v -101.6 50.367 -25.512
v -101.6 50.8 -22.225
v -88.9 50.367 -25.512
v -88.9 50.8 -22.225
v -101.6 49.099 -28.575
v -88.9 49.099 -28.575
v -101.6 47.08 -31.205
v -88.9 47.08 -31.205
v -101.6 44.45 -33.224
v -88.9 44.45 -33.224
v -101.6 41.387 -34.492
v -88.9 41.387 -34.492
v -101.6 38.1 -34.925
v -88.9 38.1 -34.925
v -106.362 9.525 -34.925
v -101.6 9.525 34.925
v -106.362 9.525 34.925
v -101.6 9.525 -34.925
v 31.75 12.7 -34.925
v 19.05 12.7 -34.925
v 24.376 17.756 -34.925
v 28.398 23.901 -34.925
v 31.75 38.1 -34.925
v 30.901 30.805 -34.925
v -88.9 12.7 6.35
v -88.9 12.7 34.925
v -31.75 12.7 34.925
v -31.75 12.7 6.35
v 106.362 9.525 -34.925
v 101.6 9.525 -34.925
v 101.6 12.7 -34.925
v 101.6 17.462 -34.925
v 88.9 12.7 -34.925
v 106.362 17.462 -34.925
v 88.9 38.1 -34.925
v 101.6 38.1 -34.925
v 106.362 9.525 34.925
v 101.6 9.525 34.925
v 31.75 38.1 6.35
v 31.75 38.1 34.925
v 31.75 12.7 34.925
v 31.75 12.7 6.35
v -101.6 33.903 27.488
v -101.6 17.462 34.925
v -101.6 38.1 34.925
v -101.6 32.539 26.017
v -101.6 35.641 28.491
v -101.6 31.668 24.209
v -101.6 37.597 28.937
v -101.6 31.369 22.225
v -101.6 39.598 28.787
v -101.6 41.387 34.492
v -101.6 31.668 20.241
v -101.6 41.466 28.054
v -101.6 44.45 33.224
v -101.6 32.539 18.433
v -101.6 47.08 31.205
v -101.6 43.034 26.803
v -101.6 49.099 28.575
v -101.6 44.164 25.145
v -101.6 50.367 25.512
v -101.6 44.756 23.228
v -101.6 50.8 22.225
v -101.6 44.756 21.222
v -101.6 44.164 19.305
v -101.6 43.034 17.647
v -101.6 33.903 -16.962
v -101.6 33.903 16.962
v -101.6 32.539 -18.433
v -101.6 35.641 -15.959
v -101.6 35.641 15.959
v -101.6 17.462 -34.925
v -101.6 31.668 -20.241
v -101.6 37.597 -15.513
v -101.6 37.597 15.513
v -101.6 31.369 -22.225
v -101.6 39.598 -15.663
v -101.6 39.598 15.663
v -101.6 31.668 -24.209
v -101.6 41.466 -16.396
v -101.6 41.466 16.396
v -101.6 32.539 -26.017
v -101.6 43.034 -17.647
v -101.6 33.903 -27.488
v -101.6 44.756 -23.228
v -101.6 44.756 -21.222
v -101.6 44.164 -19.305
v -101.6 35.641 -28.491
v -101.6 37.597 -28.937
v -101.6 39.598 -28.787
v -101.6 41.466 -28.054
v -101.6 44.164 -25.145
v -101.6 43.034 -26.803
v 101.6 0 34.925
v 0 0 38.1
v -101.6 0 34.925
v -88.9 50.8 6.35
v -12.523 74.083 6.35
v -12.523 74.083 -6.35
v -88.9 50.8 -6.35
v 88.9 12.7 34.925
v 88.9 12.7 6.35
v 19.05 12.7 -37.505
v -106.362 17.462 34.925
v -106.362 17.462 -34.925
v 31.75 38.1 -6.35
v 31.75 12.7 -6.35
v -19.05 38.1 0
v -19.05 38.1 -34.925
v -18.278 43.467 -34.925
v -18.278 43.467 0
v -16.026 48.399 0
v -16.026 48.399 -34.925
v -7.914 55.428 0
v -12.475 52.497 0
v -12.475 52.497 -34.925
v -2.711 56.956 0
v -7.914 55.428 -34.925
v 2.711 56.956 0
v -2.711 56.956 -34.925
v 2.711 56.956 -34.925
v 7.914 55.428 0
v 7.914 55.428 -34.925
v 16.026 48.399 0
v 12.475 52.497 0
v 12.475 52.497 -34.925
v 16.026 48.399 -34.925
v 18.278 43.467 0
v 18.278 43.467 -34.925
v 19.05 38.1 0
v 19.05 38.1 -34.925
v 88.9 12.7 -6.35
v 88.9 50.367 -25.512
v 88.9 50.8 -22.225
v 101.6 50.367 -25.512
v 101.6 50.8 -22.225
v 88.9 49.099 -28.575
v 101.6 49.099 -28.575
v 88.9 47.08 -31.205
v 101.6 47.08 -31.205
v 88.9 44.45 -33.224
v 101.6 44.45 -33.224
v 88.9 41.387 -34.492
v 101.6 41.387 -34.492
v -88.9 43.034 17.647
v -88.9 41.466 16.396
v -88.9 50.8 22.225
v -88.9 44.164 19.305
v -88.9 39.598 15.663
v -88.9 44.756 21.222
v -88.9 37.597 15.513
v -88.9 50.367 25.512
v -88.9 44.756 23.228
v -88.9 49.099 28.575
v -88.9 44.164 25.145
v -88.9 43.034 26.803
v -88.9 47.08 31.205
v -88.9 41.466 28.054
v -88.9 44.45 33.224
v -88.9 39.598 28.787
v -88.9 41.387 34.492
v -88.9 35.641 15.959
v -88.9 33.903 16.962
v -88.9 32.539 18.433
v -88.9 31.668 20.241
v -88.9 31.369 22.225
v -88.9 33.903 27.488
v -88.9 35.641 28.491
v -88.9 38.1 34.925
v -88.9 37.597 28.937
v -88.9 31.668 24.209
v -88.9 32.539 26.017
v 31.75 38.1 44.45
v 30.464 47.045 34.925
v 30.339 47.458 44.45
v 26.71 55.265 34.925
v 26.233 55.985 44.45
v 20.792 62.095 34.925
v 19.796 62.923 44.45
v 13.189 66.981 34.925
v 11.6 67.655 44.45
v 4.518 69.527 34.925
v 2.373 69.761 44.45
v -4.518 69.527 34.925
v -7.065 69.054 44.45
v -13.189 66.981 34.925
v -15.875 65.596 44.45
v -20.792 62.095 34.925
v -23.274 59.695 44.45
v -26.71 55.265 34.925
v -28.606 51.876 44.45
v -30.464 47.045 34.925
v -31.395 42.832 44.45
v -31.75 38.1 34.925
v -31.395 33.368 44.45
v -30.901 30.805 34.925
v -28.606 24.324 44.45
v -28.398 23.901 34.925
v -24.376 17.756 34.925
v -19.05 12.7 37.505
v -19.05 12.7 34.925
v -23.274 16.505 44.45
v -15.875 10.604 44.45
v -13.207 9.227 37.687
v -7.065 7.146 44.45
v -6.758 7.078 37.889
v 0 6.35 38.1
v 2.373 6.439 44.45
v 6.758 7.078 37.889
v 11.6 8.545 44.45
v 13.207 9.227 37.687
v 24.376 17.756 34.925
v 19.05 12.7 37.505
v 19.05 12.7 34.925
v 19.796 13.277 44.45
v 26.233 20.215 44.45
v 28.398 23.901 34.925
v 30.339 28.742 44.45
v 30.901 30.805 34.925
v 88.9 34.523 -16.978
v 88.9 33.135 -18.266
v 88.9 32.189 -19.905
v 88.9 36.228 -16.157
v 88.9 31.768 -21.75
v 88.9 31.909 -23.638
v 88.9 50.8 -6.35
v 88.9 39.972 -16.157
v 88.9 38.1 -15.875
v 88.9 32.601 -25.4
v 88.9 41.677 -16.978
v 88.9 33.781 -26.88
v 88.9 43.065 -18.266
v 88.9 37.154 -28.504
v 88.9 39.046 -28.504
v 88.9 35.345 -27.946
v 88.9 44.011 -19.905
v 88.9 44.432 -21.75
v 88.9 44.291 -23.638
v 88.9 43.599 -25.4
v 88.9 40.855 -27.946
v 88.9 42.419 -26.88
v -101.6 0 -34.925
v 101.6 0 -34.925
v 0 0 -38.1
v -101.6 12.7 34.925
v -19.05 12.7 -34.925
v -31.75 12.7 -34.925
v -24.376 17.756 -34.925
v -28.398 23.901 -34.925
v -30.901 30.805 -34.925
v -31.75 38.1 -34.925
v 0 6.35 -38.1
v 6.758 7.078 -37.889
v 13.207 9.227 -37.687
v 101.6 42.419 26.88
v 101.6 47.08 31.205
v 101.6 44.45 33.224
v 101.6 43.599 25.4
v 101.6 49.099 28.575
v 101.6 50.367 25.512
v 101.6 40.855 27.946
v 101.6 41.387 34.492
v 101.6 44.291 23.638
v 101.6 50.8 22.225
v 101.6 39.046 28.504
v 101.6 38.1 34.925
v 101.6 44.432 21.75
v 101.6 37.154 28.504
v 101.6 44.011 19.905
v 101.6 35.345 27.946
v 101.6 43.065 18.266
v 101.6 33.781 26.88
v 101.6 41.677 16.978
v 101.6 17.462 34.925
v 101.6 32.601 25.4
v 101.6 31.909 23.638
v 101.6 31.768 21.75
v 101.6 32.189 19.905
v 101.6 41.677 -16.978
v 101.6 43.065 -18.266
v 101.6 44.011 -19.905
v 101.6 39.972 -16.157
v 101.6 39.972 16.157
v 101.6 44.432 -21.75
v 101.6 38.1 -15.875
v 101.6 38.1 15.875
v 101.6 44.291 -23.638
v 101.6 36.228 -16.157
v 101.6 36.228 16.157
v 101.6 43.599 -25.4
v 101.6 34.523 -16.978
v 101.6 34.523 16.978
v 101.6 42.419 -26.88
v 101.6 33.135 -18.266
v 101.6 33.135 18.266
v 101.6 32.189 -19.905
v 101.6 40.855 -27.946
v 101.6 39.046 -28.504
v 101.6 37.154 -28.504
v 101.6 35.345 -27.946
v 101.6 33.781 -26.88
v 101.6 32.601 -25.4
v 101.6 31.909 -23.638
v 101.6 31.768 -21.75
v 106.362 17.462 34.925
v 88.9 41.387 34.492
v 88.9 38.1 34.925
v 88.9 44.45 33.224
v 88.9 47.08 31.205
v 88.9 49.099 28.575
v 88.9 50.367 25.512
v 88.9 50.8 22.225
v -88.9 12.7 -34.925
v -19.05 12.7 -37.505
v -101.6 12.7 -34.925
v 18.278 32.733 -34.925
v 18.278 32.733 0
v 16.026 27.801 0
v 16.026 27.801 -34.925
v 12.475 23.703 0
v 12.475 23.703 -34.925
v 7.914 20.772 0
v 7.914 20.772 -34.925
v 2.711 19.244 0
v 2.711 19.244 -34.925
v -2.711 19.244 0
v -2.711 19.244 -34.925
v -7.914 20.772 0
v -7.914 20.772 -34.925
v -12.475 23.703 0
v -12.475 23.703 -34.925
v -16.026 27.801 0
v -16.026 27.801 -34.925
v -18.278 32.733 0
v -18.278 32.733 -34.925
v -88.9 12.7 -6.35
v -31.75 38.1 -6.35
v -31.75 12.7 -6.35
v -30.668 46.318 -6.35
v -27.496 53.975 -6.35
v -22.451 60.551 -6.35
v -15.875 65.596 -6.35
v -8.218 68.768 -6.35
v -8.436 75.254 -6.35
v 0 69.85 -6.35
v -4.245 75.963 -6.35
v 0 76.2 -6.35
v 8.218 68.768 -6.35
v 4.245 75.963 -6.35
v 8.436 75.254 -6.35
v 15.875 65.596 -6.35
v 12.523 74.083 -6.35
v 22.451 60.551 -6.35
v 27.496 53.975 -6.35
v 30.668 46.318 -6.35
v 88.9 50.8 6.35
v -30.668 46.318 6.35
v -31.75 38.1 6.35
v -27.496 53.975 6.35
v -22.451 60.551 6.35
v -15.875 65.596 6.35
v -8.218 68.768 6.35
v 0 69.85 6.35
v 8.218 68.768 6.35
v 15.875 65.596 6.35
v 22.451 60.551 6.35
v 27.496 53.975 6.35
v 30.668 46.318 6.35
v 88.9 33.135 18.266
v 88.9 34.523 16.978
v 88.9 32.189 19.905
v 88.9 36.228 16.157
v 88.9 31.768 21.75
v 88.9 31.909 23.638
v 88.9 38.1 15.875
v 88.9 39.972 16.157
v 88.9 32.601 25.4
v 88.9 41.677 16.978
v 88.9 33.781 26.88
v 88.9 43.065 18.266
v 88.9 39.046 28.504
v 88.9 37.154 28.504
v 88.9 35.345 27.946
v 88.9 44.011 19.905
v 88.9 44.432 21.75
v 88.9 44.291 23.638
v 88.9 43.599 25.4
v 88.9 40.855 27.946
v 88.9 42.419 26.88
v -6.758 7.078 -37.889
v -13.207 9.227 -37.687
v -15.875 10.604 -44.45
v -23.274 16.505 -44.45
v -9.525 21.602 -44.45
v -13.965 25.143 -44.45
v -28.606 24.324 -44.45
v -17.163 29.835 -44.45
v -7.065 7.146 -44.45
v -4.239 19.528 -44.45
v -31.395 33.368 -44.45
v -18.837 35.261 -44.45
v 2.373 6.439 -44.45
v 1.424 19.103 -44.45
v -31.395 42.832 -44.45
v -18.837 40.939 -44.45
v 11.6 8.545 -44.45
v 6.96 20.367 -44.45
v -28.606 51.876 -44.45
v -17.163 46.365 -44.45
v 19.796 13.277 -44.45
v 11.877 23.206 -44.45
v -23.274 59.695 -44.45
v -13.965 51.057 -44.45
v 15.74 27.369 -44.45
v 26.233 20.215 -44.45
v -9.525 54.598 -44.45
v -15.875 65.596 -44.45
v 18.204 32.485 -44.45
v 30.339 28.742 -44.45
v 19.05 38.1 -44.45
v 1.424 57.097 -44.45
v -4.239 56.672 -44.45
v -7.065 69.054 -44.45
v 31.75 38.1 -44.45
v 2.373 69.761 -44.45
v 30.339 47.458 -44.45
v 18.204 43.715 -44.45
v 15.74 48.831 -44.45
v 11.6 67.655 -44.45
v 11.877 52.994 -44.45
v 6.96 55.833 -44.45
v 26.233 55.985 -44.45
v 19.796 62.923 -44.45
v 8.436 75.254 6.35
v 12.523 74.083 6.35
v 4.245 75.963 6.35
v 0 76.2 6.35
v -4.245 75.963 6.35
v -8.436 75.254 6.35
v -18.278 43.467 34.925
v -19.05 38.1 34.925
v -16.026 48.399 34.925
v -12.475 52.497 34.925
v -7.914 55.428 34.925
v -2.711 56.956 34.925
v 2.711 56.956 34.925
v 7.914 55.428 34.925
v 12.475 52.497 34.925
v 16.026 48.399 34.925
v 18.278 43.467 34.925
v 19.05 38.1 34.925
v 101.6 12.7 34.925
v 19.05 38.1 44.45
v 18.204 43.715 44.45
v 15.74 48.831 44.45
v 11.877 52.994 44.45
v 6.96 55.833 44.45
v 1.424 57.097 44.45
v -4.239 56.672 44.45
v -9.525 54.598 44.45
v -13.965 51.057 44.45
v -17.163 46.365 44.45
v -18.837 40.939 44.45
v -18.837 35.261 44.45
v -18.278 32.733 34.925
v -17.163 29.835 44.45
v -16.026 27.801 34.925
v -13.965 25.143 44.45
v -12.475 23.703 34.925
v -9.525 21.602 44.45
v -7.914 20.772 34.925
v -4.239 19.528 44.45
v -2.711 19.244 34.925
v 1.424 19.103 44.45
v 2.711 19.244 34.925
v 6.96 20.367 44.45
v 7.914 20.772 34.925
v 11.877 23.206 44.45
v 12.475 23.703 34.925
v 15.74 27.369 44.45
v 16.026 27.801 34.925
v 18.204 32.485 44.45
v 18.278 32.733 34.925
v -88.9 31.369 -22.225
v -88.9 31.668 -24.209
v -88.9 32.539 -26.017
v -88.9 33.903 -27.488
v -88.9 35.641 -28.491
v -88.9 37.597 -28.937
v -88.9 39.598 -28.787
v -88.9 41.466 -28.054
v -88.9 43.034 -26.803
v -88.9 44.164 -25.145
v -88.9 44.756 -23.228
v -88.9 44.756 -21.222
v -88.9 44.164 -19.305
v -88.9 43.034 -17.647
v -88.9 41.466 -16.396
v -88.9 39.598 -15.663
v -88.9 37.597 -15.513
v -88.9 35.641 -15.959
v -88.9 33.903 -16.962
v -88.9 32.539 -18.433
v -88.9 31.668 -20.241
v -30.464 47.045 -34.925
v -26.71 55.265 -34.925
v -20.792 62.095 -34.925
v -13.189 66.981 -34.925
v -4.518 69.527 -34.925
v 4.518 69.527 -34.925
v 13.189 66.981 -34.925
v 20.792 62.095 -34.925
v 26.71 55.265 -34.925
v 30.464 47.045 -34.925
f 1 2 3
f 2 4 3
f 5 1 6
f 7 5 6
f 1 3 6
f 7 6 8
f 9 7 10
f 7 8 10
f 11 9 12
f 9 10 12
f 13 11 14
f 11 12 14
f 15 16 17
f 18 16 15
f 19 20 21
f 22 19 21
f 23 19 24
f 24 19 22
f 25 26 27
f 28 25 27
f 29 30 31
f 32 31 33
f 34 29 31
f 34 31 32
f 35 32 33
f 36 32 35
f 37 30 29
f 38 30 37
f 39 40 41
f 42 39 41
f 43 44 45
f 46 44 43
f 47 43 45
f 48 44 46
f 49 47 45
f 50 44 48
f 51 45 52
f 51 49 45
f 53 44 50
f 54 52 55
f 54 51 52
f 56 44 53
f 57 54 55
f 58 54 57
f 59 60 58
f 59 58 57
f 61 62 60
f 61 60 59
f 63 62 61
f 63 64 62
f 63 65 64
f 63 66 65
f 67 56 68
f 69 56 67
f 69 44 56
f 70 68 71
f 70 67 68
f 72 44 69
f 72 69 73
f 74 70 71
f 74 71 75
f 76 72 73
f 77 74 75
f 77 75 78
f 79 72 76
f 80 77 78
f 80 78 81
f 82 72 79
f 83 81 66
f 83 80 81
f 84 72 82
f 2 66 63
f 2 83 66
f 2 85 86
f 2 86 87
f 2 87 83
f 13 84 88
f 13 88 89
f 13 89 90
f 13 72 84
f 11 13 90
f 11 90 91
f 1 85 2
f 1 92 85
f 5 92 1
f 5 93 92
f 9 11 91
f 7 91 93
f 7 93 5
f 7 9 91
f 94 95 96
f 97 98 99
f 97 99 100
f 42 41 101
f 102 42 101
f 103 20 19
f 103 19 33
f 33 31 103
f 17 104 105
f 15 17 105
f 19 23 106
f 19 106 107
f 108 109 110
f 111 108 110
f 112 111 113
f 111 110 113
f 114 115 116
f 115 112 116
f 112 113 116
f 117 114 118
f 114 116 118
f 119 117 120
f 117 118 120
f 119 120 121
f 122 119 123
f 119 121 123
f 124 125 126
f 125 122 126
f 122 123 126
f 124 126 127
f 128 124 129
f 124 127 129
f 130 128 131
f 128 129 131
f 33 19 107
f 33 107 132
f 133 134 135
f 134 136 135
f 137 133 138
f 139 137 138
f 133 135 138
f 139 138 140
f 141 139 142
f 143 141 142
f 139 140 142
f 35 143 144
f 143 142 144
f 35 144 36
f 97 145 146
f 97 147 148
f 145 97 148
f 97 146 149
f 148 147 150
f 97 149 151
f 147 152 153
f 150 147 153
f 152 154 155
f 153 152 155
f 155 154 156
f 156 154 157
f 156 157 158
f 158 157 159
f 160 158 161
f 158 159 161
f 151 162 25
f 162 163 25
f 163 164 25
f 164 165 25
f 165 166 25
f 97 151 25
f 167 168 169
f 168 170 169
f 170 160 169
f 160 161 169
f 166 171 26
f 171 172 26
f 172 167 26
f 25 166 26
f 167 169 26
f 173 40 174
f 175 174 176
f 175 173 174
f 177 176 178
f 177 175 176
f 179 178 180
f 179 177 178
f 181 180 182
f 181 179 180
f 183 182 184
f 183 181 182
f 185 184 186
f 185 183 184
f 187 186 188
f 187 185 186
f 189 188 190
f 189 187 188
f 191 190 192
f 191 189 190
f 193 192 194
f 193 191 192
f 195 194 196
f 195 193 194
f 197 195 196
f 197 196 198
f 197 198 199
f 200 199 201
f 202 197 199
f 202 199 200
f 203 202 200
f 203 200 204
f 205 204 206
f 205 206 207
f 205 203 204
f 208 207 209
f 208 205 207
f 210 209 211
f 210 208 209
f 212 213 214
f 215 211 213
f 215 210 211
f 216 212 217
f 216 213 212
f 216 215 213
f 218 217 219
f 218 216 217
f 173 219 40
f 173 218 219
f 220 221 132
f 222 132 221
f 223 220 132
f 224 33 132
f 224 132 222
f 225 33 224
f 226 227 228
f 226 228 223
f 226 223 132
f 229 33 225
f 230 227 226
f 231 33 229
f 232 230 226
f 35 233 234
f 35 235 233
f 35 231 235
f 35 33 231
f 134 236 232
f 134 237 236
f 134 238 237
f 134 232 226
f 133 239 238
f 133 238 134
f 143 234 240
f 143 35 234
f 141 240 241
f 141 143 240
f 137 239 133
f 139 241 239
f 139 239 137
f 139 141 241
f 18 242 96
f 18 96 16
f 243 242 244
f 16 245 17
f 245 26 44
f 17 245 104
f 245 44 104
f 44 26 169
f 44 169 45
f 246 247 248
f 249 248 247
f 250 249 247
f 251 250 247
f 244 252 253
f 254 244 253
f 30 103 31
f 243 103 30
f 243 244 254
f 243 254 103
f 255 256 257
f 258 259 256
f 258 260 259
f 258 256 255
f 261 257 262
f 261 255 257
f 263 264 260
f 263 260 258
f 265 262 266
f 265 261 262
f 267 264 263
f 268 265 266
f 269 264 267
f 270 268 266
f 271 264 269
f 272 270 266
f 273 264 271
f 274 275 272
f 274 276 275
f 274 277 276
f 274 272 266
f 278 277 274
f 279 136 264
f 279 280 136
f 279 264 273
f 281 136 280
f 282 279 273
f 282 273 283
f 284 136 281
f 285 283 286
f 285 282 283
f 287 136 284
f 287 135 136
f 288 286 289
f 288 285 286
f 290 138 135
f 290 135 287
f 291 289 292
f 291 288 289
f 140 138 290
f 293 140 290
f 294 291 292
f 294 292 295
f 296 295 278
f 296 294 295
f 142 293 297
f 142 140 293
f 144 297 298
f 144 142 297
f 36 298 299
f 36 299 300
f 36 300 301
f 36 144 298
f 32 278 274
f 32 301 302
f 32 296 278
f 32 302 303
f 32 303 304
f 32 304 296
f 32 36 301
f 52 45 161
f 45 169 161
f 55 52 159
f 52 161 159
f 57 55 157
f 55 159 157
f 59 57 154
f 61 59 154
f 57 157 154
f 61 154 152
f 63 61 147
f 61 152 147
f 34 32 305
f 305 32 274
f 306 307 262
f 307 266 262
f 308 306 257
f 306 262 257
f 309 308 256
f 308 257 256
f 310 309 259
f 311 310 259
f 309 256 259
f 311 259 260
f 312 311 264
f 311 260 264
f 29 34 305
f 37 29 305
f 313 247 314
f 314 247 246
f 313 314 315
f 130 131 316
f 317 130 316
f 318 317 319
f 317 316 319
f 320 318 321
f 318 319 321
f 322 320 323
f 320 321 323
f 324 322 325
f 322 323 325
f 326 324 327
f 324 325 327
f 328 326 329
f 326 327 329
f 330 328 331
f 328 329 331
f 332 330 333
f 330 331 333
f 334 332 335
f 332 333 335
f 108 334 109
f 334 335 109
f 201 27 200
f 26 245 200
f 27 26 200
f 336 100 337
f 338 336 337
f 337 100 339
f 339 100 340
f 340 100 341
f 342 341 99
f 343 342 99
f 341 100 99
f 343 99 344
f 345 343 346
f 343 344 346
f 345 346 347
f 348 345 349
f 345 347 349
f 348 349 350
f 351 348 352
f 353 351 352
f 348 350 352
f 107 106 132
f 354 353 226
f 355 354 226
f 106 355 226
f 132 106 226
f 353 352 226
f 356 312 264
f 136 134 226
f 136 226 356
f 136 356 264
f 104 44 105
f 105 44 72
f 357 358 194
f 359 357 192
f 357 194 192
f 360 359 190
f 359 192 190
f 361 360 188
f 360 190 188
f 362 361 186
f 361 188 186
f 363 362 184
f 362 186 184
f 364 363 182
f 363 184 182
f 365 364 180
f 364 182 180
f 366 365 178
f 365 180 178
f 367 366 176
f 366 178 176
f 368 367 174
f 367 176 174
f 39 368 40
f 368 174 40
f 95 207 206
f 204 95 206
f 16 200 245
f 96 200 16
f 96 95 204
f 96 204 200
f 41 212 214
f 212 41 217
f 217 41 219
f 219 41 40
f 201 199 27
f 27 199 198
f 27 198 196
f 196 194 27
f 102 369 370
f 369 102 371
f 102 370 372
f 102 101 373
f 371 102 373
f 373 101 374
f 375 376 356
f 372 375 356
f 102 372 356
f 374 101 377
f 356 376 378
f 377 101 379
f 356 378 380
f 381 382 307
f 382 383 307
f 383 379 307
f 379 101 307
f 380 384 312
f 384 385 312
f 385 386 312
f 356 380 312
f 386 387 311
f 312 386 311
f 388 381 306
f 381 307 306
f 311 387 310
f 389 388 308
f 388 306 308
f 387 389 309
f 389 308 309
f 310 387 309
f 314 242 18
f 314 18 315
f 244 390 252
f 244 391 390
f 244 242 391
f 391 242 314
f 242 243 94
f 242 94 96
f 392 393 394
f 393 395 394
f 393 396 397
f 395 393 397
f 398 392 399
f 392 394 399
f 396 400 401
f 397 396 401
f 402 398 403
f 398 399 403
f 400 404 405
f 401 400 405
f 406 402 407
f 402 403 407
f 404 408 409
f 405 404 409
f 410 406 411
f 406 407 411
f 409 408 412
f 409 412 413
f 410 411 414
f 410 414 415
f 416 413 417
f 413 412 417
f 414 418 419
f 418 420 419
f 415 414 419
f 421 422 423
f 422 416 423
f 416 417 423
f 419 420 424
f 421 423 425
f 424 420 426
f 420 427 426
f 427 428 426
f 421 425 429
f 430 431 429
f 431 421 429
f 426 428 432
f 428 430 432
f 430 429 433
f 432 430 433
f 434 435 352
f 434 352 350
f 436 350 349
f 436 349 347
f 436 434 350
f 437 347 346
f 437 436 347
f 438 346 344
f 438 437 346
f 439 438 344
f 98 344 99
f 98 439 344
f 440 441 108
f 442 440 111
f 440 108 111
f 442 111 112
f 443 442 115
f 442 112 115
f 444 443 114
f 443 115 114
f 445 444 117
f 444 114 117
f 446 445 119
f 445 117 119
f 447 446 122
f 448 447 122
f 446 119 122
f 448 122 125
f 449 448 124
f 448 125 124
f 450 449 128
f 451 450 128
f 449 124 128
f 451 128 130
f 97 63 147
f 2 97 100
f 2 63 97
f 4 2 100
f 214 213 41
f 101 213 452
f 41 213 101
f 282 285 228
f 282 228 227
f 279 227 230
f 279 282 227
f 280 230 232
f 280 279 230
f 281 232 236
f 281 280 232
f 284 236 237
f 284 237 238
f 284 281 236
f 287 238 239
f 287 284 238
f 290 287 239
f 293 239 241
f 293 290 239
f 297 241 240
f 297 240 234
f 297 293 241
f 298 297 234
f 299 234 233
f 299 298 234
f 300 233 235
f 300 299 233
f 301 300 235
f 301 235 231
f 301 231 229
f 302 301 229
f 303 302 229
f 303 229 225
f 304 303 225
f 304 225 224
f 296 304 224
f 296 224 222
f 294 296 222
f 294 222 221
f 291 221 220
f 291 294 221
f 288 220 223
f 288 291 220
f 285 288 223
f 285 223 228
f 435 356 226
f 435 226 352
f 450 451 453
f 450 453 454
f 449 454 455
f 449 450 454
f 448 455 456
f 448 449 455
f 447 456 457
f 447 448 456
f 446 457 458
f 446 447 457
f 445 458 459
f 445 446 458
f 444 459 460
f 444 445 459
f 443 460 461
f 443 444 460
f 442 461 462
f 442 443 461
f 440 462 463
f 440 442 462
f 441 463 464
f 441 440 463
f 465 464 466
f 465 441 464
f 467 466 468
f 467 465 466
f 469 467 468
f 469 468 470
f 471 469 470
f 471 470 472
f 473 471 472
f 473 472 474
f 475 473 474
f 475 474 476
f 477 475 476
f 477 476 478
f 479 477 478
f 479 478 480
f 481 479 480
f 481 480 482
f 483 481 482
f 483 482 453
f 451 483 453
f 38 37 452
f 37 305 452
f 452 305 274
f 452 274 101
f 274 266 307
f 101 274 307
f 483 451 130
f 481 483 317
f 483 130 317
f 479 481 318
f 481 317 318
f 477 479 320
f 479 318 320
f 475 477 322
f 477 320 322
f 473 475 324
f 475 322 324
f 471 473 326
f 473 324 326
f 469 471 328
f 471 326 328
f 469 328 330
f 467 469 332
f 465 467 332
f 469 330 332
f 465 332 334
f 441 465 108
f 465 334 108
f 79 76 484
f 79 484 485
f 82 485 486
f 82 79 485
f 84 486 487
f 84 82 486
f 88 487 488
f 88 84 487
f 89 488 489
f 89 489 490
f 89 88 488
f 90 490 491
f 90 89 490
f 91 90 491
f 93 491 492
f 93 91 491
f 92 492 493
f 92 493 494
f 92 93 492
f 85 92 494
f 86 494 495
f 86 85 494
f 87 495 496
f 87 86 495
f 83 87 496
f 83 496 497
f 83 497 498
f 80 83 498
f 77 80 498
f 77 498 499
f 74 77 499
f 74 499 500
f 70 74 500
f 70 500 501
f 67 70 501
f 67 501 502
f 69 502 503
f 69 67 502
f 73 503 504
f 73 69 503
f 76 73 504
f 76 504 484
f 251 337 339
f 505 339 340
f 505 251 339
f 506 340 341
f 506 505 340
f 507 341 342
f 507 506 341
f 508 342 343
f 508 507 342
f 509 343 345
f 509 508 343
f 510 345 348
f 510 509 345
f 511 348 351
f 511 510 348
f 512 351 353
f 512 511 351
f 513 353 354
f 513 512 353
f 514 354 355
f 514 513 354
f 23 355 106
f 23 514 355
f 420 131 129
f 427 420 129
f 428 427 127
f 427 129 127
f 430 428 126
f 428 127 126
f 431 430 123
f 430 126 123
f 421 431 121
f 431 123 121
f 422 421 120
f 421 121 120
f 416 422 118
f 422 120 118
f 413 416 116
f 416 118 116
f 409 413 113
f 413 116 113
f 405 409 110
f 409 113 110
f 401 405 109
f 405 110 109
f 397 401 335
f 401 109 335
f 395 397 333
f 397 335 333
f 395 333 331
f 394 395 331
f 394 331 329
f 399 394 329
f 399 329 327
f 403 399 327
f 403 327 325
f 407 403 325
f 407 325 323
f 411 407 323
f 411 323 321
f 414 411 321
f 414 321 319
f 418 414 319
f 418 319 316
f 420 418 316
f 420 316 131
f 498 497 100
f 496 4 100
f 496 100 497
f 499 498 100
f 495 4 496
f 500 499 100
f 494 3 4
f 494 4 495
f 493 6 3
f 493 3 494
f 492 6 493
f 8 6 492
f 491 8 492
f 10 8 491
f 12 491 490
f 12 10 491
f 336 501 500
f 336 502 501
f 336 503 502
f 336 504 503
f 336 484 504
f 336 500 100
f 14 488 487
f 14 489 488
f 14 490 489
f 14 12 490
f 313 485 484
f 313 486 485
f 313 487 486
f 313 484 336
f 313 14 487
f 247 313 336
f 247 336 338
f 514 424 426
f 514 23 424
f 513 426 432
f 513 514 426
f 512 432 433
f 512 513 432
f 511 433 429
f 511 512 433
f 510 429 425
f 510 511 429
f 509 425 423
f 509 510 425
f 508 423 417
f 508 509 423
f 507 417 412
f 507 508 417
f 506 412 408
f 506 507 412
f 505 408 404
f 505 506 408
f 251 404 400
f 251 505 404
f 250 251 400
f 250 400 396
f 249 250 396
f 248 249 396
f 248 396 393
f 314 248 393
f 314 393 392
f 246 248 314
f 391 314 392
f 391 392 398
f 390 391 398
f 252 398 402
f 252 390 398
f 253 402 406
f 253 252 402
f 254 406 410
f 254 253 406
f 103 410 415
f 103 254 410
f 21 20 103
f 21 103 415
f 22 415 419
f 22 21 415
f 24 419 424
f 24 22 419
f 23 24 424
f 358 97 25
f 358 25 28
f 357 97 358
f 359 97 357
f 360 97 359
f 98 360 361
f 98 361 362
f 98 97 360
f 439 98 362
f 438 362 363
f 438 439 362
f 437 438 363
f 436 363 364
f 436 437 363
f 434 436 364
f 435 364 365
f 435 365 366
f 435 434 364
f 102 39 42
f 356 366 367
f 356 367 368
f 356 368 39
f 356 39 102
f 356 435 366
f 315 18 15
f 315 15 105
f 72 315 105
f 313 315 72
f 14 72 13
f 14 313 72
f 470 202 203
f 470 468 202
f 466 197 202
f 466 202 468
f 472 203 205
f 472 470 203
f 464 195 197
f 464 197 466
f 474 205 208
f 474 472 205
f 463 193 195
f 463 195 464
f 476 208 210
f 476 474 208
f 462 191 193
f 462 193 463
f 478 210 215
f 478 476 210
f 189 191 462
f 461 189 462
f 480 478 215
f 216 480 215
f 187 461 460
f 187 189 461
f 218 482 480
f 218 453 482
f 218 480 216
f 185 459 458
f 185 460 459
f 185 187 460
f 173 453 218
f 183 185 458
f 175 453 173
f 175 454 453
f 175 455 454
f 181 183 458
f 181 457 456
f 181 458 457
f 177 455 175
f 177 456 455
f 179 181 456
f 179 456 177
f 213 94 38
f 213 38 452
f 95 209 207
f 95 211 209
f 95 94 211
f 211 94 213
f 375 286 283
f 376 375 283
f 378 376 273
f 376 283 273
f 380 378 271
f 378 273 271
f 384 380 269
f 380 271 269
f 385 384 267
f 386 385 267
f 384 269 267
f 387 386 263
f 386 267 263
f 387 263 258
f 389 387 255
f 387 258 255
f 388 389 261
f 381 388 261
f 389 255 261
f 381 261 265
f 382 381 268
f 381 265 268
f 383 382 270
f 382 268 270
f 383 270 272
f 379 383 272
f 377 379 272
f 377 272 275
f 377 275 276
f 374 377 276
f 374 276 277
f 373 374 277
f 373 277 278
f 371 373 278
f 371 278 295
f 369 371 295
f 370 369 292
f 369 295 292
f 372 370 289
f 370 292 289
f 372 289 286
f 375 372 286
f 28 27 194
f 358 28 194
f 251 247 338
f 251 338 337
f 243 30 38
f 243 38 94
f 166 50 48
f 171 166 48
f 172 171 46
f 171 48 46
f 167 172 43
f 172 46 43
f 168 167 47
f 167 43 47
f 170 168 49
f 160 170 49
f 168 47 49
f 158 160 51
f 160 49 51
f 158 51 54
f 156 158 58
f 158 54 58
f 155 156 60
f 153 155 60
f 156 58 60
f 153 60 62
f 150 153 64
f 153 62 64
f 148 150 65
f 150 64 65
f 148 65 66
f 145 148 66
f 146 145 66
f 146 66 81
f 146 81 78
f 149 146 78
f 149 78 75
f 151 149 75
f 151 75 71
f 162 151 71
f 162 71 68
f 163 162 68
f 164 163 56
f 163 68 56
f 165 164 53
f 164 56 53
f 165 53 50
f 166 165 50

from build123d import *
from build123d.topology import SkipClean

# Parameters (mm, degrees)
BOSS_EXTRUDE4_DEPTH     = 6.35
BOSS_EXTRUDE5_START     = -34.925
BOSS_EXTRUDE5_OUTLINE_R = 19.05
BOSS_EXTRUDE5_DEPTH     = 34.925
SKETCH5_R               = 6.35
CUT_EXTRUDE1_DEPTH      = 12.7
SKETCH6_R               = 6.731
CUT_EXTRUDE2_DEPTH      = 12.7
SKETCH8_W               = 34.925
SKETCH8_H               = 7.9375
BOSS_EXTRUDE6_DEPTH     = 4.7625
SKETCH9_W               = 34.925
SKETCH9_H               = 7.9375
BOSS_EXTRUDE7_DEPTH     = 4.7625
FILLET1_R               = 12.7
FILLET1_OF_MIRROR1_R    = 12.7
SKETCH10_R              = 31.75
SKETCH10_R_2            = 19.05
BOSS_EXTRUDE8_DEPTH     = 44.45
BOSS_EXTRUDE9_DEPTH     = 12.7


# Read off the part's stored shape, not the designer's step: Boss-Extrude5
with BuildPart() as part:
    # Sketch2 → Boss-Extrude4 (new body)
    with BuildSketch(Plane.XY):
        with BuildLine():
            ThreePointArc((-12.522963776, 74.083126299), (-37.56705413, 31.749689456), (0, 0))
            Line((0, 0), (0, 6.35))
            ThreePointArc((0, 6.35), (-31.75, 38.1), (0, 69.85))
            Line((0, 69.85), (0, 76.2))
            ThreePointArc((0, 76.2), (-6.350310544, 75.66705413), (-12.522963776, 74.083126299))
        make_face()
        with BuildLine():
            Line((0, 6.35), (0, 0))
            ThreePointArc((0, 0), (26.940768363, 11.159231637), (38.1, 38.1))
            ThreePointArc((38.1, 38.1), (31.054266373, 60.173571076), (12.522963776, 74.083126299))
            ThreePointArc((12.522963776, 74.083126299), (6.350310544, 75.66705413), (0, 76.2))
            Line((0, 76.2), (0, 69.85))
            ThreePointArc((0, 69.85), (22.450640303, 60.550640303), (31.75, 38.1))
            ThreePointArc((31.75, 38.1), (22.450640303, 15.649359697), (0, 6.35))
        make_face()
        with BuildLine():
            ThreePointArc((38.1, 38.1), (26.940768363, 11.159231637), (0, 0))
            Line((0, 0), (88.9, 0))
            Line((88.9, 0), (88.9, 50.8))
            Line((88.9, 50.8), (12.522963776, 74.083126299))
            ThreePointArc((12.522963776, 74.083126299), (31.054266373, 60.173571076), (38.1, 38.1))
        make_face()
        with BuildLine():
            Line((-88.9, 0), (0, 0))
            ThreePointArc((0, 0), (-37.56705413, 31.749689456), (-12.522963776, 74.083126299))
            Line((-12.522963776, 74.083126299), (-88.9, 50.8))
            Line((-88.9, 50.8), (-88.9, 0))
        make_face()
    boss_extrude4 = extrude(amount=BOSS_EXTRUDE4_DEPTH)

    # Boss-Extrude5 outline → Boss-Extrude5 (add)
    with BuildSketch(Plane(origin=(0, 0, 0), x_dir=(-1, 0, 0), z_dir=(0, 0, -1)).offset(BOSS_EXTRUDE5_START)):
        with BuildLine():
            Line((101.6, 0), (101.6, 50.8))
            Line((101.6, 50.8), (88.9, 50.8))
            Line((88.9, 50.8), (88.9, 12.7))
            Line((88.9, 12.7), (31.75, 12.7))
            Line((31.75, 12.7), (31.75, 38.1))
            ThreePointArc((31.75, 38.1), (0, 69.85), (-31.75, 38.1))
            Line((-31.75, 38.1), (-31.75, 12.7))
            Line((-31.75, 12.7), (-88.9, 12.7))
            Line((-88.9, 12.7), (-88.9, 50.8))
            Line((-88.9, 50.8), (-101.6, 50.8))
            Line((-101.6, 50.8), (-101.6, 0))
            Line((-101.6, 0), (101.6, 0))
        make_face()
        with Locations((0, 38.1)):
            Circle(BOSS_EXTRUDE5_OUTLINE_R, mode=Mode.SUBTRACT)
    boss_extrude5 = extrude(amount=BOSS_EXTRUDE5_DEPTH)

    # Sketch5 → Cut-Extrude1 (cut)
    with BuildSketch(Plane(origin=(101.6, 0, 0), x_dir=(0, 0, -1), z_dir=(1, 0, 0))):
        with Locations((-22.225, 38.1)):
            Circle(SKETCH5_R)
    cut_extrude1 = extrude(amount=-CUT_EXTRUDE1_DEPTH, mode=Mode.SUBTRACT)

    # Sketch6 → Cut-Extrude2 (cut)
    with BuildSketch(Plane.ZY.offset(101.6)):
        with Locations(Location((22.225, 38.1, 0), (0, 0, 270))):
            Circle(SKETCH6_R)
    cut_extrude2 = extrude(amount=-CUT_EXTRUDE2_DEPTH, mode=Mode.SUBTRACT)

    # Sketch8 → Boss-Extrude6 (add)
    with BuildSketch(Plane(origin=(101.6, 0, 0), x_dir=(0, 0, -1), z_dir=(1, 0, 0))):
        with Locations((-17.4625, 13.49375)):
            Rectangle(SKETCH8_W, SKETCH8_H)
    boss_extrude6 = extrude(amount=BOSS_EXTRUDE6_DEPTH)

    # Sketch9 → Boss-Extrude7 (add)
    with BuildSketch(Plane.ZY.offset(101.6)):
        with Locations((17.4625, 13.49375)):
            Rectangle(SKETCH9_W, SKETCH9_H)
    boss_extrude7 = extrude(amount=BOSS_EXTRUDE7_DEPTH)

    # Fillet1
    fillet1_edges = [part.edges().sort_by_distance(p)[0] for p in [
        (95.25, 50.8, 34.925),
        (-95.25, 50.8, 34.925),
    ]]
    fillet(fillet1_edges, radius=FILLET1_R)

    # Mirror1: Boss-Extrude4, Boss-Extrude5, Cut-Extrude1, Cut-Extrude2, Boss-Extrude6, Boss-Extrude7 across plane
    add(boss_extrude4.mirror(Plane.XY))
    add(boss_extrude5.mirror(Plane.XY))
    add(cut_extrude1.mirror(Plane.XY), mode=Mode.SUBTRACT)
    add(cut_extrude2.mirror(Plane.XY), mode=Mode.SUBTRACT)
    add(boss_extrude6.mirror(Plane.XY))
    add(boss_extrude7.mirror(Plane.XY))

    # Fillet1 of Mirror1
    fillet1_of_mirror1_edges = [part.edges().sort_by_distance(p)[0] for p in [
        (95.25, 50.8, -34.925),
        (-95.25, 50.8, -34.925),
    ]]
    fillet(fillet1_of_mirror1_edges, radius=FILLET1_OF_MIRROR1_R)

    # Sketch10 → Boss-Extrude8 (add, symmetric)
    with SkipClean():  # the faces are left unmerged after this step: merging them gives an invalid solid
        with BuildSketch(Plane.XY):
            with Locations((0, 38.1)):
                Circle(SKETCH10_R)
            with Locations((0, 38.1)):
                Circle(SKETCH10_R_2, mode=Mode.SUBTRACT)
        extrude(amount=BOSS_EXTRUDE8_DEPTH, both=True)

    # Sketch11 → Boss-Extrude9 (add)
    with SkipClean():  # the faces are left unmerged after this step: merging them gives an invalid solid
        with BuildSketch(Plane.XZ):
            Polygon((101.6, 34.925), (0, 38.1), (-101.6, 34.925), align=None)
            Polygon((-101.6, -34.925), (0, -38.1), (101.6, -34.925), align=None)
        extrude(amount=-BOSS_EXTRUDE9_DEPTH)


solid = part.part
